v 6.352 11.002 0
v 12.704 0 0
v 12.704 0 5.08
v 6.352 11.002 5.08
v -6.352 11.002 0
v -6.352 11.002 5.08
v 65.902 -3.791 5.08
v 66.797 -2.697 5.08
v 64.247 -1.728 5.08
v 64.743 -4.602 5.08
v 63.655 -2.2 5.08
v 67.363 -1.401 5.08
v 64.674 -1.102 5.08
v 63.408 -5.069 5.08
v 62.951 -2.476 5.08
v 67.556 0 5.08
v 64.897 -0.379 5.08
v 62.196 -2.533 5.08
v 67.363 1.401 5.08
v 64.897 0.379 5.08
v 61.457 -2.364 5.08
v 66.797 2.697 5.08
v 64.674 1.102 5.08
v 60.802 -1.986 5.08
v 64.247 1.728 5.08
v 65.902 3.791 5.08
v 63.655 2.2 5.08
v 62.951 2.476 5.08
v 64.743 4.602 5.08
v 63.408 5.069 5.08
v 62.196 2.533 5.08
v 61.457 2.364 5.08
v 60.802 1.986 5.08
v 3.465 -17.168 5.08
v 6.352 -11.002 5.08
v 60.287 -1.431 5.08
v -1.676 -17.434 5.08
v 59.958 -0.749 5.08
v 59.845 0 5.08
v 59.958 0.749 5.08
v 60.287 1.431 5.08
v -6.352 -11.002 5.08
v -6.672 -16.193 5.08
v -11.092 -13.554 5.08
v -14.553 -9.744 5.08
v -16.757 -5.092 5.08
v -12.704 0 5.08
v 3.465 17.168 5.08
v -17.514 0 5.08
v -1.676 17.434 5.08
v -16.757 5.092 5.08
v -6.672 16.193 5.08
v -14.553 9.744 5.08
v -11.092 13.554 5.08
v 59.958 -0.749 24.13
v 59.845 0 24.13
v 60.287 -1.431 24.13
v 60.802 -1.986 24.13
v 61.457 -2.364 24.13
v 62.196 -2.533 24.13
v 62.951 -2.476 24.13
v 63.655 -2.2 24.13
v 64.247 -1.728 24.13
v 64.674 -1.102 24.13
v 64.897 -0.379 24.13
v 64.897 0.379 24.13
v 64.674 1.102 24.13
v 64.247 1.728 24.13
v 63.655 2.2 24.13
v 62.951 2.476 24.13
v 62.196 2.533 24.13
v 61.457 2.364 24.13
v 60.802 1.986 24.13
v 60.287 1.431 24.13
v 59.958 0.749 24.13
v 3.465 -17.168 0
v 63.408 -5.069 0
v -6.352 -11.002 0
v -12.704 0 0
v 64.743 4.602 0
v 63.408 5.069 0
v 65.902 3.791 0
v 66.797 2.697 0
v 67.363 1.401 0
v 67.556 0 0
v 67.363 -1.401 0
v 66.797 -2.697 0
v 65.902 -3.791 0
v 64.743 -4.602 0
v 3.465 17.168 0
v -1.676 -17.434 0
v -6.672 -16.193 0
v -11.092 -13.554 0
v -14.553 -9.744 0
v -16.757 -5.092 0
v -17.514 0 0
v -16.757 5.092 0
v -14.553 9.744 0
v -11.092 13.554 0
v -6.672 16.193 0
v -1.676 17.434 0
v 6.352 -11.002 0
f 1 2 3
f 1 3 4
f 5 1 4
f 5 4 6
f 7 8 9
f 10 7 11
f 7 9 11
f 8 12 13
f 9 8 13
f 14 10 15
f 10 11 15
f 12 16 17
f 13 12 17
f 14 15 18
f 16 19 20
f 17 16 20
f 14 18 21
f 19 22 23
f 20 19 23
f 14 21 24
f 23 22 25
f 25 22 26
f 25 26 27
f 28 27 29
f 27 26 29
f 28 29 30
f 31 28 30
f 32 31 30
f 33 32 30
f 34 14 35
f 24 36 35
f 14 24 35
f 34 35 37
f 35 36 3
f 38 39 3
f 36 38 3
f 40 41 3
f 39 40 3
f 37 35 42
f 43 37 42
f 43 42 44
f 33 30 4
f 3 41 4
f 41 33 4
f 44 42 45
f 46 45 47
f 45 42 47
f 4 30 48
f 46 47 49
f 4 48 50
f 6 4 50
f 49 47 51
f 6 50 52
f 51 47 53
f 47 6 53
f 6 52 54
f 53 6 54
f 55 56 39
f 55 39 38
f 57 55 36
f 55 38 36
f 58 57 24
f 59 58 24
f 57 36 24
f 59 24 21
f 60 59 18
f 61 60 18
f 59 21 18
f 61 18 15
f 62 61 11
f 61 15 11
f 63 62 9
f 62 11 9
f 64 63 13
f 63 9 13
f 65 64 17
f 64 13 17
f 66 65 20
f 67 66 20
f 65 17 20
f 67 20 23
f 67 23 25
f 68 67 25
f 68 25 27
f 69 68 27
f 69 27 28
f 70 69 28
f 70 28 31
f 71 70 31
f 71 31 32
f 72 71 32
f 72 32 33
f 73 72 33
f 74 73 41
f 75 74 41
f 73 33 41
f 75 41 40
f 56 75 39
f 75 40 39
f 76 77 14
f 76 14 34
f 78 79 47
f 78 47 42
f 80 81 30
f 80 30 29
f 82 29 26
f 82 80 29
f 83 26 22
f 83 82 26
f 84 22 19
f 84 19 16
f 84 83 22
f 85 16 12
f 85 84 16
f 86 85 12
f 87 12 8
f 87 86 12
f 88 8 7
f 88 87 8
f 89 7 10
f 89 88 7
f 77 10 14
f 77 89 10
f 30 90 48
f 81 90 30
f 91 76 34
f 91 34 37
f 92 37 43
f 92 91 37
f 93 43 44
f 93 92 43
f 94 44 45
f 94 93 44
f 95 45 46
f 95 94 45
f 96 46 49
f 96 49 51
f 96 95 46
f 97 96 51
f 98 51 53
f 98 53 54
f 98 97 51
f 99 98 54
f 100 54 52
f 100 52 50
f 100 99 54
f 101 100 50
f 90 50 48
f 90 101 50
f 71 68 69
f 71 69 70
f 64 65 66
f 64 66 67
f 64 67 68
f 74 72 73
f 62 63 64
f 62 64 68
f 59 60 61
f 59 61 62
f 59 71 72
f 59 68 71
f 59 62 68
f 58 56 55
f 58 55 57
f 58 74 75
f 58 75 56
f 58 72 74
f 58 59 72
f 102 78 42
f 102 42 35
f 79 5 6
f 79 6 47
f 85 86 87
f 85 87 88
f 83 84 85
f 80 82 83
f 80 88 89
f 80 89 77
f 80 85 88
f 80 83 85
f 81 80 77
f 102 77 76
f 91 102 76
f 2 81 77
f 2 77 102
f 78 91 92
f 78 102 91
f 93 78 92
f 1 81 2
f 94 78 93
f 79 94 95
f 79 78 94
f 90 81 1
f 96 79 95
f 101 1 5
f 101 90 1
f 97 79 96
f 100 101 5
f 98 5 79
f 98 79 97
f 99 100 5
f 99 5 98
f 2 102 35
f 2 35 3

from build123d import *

# Parameters (mm, degrees)
BOSS_EXTRUDE1_DEPTH = 5.08
SKETCH2_R           = 2.54
BOSS_EXTRUDE2_DEPTH = 19.05


with BuildPart() as part:
    # Sketch1 → Boss-Extrude1 (new body)
    with BuildSketch(Plane.XY):
        with BuildLine():
            Line((3.465176556, 17.167746033), (63.408488693, 5.068652798))
            ThreePointArc((63.408488693, 5.068652798), (67.556291682, 0), (63.408488693, -5.068652798))
            Line((63.408488693, -5.068652798), (3.465176556, -17.167746033))
            ThreePointArc((3.465176556, -17.167746033), (-17.513964497, 0), (3.465176556, 17.167746033))
        make_face()
        Polygon((12.70363461, 0), (6.351817305, 11.001670293), (-6.351817305, 11.001670293), (-12.70363461, 0), (-6.351817305, -11.001670293), (6.351817305, -11.001670293), align=None, mode=Mode.SUBTRACT)
    extrude(amount=BOSS_EXTRUDE1_DEPTH)

    # Sketch2 → Boss-Extrude2 (add)
    with BuildSketch(Plane.XY.offset(5.08)):
        with Locations(Location((62.385420387, 0, 0), (0, 0, 180))):
            Circle(SKETCH2_R)
    extrude(amount=BOSS_EXTRUDE2_DEPTH)


solid = part.part
